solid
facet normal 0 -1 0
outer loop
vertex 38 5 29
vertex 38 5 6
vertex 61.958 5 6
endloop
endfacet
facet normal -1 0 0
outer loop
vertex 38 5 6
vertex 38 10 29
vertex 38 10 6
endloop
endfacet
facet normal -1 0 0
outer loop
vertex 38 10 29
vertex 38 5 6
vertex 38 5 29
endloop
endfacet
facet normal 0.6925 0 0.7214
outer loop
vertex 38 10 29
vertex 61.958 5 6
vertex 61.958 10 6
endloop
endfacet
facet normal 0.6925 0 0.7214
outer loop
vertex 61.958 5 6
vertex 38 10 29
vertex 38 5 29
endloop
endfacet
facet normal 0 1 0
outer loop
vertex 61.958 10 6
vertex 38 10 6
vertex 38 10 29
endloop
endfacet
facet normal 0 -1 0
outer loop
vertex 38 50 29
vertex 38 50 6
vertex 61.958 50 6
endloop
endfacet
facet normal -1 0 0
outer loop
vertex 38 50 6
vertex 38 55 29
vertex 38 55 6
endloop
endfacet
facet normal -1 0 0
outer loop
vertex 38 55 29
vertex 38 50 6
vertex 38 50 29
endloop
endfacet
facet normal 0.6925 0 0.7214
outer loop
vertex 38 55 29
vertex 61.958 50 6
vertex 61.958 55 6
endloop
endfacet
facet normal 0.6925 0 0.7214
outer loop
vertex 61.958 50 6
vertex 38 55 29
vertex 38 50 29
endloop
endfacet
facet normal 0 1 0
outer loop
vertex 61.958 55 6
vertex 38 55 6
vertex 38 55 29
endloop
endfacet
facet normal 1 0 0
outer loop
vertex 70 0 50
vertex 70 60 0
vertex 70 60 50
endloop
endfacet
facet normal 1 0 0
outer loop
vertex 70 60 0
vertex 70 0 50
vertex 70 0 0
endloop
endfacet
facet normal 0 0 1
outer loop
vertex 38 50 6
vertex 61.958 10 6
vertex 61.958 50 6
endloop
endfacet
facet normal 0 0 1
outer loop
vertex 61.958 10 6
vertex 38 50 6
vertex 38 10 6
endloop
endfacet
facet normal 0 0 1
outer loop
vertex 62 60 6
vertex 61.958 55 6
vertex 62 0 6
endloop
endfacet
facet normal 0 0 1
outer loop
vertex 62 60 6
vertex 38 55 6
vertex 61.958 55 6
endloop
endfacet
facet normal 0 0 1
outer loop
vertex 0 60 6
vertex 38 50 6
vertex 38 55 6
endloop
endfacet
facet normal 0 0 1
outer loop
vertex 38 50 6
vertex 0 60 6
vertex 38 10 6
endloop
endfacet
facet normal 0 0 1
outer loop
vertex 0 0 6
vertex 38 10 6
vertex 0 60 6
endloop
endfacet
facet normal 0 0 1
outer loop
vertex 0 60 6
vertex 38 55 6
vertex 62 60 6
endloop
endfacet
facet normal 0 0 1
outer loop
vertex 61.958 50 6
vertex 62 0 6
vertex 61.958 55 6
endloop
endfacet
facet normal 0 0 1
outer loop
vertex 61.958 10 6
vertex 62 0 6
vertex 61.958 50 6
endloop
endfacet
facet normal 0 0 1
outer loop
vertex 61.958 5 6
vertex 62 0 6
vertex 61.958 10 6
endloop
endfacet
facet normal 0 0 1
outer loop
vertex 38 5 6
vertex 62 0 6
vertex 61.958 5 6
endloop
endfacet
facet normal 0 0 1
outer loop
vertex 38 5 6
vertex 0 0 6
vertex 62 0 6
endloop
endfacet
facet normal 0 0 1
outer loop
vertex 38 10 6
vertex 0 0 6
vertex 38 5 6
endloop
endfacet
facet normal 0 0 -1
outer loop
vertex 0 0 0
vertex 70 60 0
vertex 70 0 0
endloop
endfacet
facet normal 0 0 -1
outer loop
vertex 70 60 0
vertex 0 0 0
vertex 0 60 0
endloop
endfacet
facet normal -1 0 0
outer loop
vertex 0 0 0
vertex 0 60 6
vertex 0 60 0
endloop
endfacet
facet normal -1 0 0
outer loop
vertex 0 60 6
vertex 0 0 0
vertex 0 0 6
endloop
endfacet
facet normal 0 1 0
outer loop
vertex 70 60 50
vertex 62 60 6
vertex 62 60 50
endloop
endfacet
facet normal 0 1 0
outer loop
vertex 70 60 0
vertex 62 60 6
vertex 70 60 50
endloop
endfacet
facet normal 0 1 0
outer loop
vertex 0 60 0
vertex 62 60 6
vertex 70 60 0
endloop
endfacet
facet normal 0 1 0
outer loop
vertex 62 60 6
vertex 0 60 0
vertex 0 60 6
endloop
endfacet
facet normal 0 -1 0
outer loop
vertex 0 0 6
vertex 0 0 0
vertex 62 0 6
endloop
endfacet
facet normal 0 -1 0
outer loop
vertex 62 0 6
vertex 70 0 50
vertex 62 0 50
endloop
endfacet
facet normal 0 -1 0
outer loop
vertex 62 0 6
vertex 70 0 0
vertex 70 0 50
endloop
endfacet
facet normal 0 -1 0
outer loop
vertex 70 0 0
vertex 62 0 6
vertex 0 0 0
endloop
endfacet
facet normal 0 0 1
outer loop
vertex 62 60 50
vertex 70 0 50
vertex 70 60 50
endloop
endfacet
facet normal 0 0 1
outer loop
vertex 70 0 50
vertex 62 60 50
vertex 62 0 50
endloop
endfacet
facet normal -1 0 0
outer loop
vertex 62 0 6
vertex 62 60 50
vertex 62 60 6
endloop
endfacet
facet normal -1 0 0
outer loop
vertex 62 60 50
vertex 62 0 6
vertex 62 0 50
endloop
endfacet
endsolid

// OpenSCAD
$fn = 32;

// ----------------------------------------------------------------------
// Rib bracket: 2-gusset L bracket
// ----------------------------------------------------------------------

// --- parameters (mm) ---
base_l = 70;              // foot length, X
base_w = 60;              // foot width, Y
base_t = 6;               // foot thickness
plate_t = 8;              // upright plate thickness
plate_h = 50;             // overall height
gus_l = 24;               // gusset leg along the foot
gus_h = 24;               // gusset height
gus_t = 5;                // gusset thickness
gus_edge = 5;             // gusset margin from the foot edge
n_gus = 2;                // gusset count

gus_pitch = (base_w - 2 * gus_edge - gus_t) / (n_gus - 1);  // gusset pitch

union() {
  cube([base_l, base_w, base_t]);
  translate([base_l - plate_t, 0, base_t - 1])
    cube([plate_t, base_w, plate_h - base_t + 1]);
  for (i = [0 : n_gus - 1])
    translate([base_l - plate_t - gus_l, gus_edge + i * gus_pitch, base_t - 1])
      rotate([-90, 0, 0])
        linear_extrude(height = gus_t)
          polygon(points = [[0, 0], [gus_l + 1, 0], [0, -gus_h]]);
}
